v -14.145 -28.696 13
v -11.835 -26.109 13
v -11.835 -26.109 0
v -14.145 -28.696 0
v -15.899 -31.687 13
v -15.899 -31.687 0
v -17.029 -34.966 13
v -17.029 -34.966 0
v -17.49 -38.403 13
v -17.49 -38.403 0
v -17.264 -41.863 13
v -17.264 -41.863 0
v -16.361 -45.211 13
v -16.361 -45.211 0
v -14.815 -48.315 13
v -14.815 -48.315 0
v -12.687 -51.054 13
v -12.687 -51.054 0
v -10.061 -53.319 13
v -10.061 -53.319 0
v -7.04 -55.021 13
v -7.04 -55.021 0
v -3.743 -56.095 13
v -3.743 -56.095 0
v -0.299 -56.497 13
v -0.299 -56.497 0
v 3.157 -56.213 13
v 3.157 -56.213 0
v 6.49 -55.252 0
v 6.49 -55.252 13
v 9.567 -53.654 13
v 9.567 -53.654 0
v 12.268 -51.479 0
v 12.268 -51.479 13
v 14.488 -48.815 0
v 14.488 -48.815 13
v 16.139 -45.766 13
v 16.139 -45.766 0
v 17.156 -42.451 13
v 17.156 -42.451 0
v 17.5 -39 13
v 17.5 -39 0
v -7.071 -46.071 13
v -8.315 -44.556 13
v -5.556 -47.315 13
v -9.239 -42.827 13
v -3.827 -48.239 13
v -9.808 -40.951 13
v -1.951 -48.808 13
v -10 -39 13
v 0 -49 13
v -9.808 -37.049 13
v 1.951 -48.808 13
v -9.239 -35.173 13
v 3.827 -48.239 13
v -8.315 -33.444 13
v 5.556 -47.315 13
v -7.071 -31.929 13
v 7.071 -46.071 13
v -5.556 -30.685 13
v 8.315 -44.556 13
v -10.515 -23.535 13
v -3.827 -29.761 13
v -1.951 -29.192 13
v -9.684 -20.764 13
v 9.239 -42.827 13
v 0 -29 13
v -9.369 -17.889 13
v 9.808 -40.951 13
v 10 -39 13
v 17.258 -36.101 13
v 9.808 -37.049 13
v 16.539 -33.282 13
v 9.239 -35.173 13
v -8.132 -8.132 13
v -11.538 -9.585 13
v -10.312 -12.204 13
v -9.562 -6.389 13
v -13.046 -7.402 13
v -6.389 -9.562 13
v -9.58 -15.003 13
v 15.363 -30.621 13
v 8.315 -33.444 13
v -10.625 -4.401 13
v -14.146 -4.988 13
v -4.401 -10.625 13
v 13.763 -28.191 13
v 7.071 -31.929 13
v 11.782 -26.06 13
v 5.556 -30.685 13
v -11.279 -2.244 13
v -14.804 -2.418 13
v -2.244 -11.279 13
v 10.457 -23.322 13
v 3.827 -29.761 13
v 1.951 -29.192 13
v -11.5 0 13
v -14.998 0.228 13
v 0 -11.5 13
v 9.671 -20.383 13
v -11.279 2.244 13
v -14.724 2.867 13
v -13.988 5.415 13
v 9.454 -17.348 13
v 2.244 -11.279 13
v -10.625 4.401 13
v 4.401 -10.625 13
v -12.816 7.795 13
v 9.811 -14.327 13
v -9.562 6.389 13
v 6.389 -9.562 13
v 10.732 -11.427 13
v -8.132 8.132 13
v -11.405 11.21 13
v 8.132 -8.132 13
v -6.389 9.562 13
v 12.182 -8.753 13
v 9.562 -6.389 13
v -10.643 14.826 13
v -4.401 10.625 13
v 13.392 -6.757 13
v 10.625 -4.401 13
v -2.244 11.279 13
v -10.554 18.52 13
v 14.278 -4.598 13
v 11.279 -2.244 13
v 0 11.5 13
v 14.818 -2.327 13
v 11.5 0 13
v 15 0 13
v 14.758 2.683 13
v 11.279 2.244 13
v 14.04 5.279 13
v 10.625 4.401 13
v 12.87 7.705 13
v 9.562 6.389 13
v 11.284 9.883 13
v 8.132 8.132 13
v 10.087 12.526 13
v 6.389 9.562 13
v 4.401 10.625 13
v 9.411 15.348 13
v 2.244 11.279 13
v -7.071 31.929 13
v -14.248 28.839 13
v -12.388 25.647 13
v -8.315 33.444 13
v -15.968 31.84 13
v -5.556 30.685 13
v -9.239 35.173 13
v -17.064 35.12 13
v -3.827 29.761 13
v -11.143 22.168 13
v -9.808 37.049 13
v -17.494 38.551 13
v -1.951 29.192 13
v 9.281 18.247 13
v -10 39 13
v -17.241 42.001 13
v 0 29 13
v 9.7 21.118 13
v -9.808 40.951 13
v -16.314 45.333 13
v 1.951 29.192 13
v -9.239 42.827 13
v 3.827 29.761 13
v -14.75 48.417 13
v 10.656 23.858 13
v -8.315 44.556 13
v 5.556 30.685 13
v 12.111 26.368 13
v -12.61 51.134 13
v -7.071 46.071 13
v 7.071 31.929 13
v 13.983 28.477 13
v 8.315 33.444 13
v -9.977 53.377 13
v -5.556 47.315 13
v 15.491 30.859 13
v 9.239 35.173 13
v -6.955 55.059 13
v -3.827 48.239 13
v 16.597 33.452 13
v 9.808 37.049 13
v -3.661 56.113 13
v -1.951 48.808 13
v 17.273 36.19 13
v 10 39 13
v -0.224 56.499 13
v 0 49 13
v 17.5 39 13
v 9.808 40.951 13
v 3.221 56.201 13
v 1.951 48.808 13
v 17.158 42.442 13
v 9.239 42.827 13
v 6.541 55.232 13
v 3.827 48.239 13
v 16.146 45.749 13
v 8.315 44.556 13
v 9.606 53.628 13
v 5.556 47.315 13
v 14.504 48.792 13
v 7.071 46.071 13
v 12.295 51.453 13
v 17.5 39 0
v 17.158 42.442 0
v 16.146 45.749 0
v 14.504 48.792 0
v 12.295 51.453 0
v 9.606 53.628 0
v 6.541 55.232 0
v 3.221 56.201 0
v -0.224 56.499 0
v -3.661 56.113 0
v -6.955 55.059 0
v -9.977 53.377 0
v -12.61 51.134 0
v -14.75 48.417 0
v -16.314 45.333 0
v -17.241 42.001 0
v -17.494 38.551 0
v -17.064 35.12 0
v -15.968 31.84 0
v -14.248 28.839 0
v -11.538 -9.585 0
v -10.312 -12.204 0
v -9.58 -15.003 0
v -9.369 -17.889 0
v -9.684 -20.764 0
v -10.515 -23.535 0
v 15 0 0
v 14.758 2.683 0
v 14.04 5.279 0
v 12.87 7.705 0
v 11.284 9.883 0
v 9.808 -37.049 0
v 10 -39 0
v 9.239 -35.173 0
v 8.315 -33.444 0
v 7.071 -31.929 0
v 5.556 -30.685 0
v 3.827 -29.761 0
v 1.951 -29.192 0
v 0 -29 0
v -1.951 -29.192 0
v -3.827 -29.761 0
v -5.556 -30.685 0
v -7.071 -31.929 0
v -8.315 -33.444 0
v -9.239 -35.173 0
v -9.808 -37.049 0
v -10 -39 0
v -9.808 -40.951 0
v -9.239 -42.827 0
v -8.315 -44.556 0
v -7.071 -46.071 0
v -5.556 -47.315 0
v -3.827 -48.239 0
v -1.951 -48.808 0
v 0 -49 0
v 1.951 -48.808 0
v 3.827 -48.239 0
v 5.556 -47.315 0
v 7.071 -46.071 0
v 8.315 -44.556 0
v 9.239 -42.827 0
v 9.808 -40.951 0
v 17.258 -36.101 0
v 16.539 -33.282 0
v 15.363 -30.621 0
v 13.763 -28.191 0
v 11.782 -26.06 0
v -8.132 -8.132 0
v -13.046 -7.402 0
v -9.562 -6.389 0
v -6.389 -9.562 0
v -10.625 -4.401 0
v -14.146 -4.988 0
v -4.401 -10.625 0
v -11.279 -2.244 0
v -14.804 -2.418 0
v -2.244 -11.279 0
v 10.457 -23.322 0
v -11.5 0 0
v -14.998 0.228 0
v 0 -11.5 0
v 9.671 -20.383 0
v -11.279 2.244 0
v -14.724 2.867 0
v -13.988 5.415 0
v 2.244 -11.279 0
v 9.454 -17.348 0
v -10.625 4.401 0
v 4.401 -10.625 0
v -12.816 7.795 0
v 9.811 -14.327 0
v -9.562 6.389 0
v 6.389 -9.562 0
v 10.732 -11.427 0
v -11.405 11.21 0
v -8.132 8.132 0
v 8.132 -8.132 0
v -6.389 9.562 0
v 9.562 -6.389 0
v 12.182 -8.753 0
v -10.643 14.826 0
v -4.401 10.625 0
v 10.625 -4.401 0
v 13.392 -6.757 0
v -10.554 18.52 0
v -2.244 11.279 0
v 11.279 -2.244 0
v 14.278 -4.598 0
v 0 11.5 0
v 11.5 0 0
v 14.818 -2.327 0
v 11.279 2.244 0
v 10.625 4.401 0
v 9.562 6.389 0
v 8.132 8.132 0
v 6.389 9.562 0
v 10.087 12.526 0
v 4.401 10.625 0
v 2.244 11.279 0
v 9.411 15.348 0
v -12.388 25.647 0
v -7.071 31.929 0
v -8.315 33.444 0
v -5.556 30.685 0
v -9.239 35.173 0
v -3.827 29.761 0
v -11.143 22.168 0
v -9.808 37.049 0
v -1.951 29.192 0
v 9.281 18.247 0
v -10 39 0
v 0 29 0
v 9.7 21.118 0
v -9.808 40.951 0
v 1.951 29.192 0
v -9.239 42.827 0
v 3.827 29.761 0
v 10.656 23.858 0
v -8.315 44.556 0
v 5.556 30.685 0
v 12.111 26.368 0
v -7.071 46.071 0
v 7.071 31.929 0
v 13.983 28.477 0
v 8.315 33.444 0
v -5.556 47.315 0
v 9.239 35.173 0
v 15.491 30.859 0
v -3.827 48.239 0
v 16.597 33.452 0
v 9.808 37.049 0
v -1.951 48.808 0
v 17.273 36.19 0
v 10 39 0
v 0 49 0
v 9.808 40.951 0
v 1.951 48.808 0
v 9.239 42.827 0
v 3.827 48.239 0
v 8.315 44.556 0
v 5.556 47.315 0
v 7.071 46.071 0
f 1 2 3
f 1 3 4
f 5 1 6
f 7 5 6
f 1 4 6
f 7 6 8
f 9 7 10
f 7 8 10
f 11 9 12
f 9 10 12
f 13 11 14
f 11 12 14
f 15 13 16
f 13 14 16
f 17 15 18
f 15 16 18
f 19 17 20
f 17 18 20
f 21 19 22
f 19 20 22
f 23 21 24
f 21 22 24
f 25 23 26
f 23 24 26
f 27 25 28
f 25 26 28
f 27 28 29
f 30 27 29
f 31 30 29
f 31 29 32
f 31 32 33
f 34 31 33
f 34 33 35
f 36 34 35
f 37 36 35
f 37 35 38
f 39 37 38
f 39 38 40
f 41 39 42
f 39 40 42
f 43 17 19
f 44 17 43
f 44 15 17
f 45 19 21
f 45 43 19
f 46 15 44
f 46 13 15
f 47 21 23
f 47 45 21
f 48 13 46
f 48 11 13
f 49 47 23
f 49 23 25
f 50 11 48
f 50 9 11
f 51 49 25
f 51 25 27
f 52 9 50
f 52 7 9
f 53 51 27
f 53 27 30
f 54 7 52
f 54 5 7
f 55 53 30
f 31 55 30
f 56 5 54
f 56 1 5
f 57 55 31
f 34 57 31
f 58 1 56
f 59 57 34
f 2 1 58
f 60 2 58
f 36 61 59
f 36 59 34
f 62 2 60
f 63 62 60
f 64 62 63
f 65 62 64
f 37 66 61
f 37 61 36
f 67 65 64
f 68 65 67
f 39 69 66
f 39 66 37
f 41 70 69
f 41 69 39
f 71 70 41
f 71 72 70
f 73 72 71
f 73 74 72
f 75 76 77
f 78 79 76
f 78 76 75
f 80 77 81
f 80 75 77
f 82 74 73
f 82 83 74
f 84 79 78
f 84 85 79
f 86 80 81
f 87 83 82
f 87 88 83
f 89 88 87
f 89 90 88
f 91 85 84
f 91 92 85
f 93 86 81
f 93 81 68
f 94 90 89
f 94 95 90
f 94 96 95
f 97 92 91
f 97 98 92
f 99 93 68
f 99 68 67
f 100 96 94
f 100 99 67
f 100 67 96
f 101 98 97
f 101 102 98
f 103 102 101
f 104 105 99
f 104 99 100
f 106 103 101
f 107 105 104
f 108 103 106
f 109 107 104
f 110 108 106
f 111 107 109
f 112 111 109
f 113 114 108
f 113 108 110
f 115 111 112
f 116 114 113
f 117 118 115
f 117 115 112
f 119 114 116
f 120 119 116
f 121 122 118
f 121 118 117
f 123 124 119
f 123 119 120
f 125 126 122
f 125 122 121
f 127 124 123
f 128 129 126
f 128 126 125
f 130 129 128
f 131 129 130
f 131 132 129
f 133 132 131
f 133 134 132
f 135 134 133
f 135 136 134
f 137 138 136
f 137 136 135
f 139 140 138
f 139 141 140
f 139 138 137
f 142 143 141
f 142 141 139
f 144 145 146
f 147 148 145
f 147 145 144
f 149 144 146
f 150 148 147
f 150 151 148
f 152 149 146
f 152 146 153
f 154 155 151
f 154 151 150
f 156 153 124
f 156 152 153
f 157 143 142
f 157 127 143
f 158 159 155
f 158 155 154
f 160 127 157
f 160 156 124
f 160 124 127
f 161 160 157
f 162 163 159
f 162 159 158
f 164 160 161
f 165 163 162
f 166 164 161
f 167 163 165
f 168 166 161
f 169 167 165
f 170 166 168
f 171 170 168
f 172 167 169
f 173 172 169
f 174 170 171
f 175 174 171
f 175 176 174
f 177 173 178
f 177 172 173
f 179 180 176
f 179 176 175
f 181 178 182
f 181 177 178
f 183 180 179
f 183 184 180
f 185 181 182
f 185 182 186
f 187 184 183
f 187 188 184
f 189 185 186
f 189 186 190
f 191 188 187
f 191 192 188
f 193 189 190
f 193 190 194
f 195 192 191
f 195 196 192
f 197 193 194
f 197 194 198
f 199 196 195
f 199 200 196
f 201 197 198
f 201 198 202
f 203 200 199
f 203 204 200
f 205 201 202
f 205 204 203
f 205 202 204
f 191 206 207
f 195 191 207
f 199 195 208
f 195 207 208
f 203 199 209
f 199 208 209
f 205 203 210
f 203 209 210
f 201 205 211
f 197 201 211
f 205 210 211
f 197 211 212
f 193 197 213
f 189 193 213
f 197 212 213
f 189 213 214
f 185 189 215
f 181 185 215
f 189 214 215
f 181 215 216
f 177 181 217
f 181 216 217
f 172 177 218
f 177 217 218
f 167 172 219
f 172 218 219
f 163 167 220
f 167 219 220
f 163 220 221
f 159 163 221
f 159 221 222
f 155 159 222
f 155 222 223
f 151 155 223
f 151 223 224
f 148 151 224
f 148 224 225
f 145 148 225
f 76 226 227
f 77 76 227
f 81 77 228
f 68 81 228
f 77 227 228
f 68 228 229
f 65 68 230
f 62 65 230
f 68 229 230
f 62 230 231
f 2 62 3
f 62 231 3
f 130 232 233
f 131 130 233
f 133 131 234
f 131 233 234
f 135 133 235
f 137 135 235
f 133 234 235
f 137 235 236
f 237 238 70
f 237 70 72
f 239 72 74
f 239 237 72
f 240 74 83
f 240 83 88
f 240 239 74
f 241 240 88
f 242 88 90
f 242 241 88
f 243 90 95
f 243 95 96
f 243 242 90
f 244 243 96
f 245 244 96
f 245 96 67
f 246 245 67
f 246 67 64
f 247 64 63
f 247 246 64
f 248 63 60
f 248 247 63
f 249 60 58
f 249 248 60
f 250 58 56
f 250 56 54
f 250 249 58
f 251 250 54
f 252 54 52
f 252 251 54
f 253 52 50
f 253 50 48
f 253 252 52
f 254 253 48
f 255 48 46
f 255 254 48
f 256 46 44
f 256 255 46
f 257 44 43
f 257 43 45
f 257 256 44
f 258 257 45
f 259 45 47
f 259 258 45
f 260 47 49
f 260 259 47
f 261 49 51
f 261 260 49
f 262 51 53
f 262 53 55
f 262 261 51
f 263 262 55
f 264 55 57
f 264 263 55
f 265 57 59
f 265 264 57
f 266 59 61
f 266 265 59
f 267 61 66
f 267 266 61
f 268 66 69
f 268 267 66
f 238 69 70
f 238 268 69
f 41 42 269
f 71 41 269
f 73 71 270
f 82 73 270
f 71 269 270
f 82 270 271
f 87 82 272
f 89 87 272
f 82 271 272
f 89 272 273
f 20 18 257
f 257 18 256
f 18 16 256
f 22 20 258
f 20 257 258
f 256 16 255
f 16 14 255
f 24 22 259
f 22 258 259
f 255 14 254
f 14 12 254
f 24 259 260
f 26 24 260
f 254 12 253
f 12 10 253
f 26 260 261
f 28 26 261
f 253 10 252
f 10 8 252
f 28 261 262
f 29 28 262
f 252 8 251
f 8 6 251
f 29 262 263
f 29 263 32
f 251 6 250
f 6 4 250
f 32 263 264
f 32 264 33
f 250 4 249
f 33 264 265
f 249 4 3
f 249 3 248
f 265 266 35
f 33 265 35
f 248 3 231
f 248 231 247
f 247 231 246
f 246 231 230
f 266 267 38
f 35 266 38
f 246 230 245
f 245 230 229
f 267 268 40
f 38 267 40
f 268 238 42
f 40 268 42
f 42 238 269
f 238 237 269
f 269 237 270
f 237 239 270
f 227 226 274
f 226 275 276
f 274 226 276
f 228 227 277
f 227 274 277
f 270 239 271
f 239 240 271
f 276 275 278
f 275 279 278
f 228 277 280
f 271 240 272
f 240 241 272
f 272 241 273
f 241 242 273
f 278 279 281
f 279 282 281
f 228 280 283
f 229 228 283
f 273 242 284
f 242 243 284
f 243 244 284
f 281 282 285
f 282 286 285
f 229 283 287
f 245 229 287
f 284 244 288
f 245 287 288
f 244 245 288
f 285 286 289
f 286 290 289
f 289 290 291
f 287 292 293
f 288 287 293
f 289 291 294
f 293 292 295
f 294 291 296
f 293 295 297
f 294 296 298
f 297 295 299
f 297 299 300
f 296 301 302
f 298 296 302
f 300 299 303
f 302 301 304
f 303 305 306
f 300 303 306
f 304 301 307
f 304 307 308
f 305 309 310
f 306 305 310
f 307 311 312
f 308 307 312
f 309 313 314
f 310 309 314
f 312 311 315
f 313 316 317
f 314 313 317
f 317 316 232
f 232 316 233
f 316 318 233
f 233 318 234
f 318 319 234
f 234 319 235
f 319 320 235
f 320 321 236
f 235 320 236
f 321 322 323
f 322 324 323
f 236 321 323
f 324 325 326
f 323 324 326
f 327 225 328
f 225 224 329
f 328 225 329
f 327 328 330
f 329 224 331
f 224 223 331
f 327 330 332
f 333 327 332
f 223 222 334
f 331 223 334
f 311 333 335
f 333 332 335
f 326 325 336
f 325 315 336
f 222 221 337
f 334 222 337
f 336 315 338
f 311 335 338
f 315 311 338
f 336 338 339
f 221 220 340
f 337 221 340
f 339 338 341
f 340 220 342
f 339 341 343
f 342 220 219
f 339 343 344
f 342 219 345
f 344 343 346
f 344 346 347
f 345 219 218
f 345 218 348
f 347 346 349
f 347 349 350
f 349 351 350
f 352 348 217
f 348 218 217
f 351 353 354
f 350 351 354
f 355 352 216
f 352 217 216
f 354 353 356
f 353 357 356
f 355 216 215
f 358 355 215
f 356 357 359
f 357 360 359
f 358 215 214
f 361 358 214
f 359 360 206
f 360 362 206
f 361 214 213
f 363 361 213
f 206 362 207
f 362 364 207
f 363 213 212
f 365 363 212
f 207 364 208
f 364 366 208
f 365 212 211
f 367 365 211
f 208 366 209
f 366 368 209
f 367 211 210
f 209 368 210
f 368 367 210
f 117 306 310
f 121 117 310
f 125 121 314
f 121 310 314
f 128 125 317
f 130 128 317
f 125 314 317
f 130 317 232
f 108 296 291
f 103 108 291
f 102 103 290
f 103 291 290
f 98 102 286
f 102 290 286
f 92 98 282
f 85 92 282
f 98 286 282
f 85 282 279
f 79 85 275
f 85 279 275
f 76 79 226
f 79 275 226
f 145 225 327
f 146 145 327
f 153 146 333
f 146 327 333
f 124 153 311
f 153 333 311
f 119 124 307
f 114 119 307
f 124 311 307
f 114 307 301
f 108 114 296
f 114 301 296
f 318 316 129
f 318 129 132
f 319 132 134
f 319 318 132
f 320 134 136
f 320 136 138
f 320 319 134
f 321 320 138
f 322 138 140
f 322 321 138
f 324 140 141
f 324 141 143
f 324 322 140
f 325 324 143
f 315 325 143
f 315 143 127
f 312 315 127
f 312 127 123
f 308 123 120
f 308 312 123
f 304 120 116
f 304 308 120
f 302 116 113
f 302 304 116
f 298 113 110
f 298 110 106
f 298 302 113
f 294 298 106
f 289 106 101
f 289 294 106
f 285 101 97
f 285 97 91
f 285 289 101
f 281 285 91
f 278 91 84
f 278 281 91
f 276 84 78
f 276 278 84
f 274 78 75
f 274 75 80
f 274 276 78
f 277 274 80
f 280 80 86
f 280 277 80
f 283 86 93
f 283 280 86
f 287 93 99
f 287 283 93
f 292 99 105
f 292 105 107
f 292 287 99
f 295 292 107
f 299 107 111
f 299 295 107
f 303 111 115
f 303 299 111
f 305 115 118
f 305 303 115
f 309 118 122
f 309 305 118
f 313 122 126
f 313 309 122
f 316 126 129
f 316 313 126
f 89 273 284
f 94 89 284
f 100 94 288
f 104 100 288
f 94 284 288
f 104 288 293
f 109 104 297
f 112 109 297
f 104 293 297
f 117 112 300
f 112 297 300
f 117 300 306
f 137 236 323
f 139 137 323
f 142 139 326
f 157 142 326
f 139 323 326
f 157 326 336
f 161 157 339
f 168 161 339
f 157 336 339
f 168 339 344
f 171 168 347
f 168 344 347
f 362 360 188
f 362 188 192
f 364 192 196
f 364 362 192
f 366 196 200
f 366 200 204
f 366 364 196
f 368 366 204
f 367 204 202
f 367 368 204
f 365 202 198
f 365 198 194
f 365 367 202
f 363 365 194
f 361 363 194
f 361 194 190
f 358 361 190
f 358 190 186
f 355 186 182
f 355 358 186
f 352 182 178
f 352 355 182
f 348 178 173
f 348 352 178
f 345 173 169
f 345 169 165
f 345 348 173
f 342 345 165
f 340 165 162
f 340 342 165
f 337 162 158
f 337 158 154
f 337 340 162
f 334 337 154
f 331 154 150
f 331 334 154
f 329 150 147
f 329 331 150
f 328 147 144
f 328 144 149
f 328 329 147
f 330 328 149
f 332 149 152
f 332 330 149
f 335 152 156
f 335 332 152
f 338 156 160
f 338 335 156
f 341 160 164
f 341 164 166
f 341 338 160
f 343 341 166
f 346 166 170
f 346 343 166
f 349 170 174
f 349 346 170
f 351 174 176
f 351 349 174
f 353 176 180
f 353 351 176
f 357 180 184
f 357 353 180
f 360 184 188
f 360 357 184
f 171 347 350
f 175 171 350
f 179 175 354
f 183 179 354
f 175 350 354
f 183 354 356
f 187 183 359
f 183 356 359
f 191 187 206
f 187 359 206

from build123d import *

# Parameters (mm, degrees)
F0_R     = 10
F0_R_2   = 11.5
F1_DEPTH = 13


with BuildPart() as f1:
    # F0 (on Top) → F1 (new body)
    with BuildSketch(Plane.XY):
        with BuildLine():
            ThreePointArc((12.111219, 26.367962), (16.096526, 32.133281), (17.5, 39))
            ThreePointArc((17.5, 39), (-5.334249, 55.667207), (-14.24809, 28.839196))
            ThreePointArc((-14.24809, 28.839196), (-1.633494, 21.576404), (12.111219, 26.367962))
        make_face()
        with Locations((0, 39)):
            Circle(F0_R, mode=Mode.SUBTRACT)
        with BuildLine():
            ThreePointArc((11.283926, 9.882966), (-1.294732, 14.944018), (-12.815525, 7.795019))
            ThreePointArc((-12.815525, 7.795019), (-14.959668, -1.099247), (-11.53846, -9.584568))
            ThreePointArc((-11.53846, -9.584568), (0.525844, -14.99078), (12.181685, -8.752517))
            ThreePointArc((12.181685, -8.752517), (14.278047, -4.597539), (15, 0))
            ThreePointArc((15, 0), (14.040279, 5.279257), (11.283926, 9.882966))
        make_face()
        Circle(F0_R_2, mode=Mode.SUBTRACT)
        with BuildLine():
            ThreePointArc((12.111219, 26.367962), (-1.633494, 21.576404), (-14.24809, 28.839196))
            ThreePointArc((-14.24809, 28.839196), (-10.554394, 18.519793), (-12.815525, 7.795019))
            ThreePointArc((-12.815525, 7.795019), (-1.294732, 14.944018), (11.283926, 9.882966))
            ThreePointArc((11.283926, 9.882966), (9.280567, 18.246761), (12.111219, 26.367962))
        make_face()
        with BuildLine():
            ThreePointArc((12.181685, -8.752517), (0.525844, -14.99078), (-11.53846, -9.584568))
            ThreePointArc((-11.53846, -9.584568), (-9.368827, -17.888551), (-11.835438, -26.109212))
            ThreePointArc((-11.835438, -26.109212), (-0.036151, -21.500037), (11.782078, -26.060424))
            ThreePointArc((11.782078, -26.060424), (9.453579, -17.348097), (12.181685, -8.752517))
        make_face()
        with BuildLine():
            ThreePointArc((11.782078, -26.060424), (-0.036151, -21.500037), (-11.835438, -26.109212))
            ThreePointArc((-11.835438, -26.109212), (-7.040236, -55.021394), (17.5, -39))
            ThreePointArc((17.5, -39), (16.006817, -31.926683), (11.782078, -26.060424))
        make_face()
        with Locations((0, -39)):
            Circle(F0_R, mode=Mode.SUBTRACT)
    extrude(amount=F1_DEPTH)


solid = f1.part
